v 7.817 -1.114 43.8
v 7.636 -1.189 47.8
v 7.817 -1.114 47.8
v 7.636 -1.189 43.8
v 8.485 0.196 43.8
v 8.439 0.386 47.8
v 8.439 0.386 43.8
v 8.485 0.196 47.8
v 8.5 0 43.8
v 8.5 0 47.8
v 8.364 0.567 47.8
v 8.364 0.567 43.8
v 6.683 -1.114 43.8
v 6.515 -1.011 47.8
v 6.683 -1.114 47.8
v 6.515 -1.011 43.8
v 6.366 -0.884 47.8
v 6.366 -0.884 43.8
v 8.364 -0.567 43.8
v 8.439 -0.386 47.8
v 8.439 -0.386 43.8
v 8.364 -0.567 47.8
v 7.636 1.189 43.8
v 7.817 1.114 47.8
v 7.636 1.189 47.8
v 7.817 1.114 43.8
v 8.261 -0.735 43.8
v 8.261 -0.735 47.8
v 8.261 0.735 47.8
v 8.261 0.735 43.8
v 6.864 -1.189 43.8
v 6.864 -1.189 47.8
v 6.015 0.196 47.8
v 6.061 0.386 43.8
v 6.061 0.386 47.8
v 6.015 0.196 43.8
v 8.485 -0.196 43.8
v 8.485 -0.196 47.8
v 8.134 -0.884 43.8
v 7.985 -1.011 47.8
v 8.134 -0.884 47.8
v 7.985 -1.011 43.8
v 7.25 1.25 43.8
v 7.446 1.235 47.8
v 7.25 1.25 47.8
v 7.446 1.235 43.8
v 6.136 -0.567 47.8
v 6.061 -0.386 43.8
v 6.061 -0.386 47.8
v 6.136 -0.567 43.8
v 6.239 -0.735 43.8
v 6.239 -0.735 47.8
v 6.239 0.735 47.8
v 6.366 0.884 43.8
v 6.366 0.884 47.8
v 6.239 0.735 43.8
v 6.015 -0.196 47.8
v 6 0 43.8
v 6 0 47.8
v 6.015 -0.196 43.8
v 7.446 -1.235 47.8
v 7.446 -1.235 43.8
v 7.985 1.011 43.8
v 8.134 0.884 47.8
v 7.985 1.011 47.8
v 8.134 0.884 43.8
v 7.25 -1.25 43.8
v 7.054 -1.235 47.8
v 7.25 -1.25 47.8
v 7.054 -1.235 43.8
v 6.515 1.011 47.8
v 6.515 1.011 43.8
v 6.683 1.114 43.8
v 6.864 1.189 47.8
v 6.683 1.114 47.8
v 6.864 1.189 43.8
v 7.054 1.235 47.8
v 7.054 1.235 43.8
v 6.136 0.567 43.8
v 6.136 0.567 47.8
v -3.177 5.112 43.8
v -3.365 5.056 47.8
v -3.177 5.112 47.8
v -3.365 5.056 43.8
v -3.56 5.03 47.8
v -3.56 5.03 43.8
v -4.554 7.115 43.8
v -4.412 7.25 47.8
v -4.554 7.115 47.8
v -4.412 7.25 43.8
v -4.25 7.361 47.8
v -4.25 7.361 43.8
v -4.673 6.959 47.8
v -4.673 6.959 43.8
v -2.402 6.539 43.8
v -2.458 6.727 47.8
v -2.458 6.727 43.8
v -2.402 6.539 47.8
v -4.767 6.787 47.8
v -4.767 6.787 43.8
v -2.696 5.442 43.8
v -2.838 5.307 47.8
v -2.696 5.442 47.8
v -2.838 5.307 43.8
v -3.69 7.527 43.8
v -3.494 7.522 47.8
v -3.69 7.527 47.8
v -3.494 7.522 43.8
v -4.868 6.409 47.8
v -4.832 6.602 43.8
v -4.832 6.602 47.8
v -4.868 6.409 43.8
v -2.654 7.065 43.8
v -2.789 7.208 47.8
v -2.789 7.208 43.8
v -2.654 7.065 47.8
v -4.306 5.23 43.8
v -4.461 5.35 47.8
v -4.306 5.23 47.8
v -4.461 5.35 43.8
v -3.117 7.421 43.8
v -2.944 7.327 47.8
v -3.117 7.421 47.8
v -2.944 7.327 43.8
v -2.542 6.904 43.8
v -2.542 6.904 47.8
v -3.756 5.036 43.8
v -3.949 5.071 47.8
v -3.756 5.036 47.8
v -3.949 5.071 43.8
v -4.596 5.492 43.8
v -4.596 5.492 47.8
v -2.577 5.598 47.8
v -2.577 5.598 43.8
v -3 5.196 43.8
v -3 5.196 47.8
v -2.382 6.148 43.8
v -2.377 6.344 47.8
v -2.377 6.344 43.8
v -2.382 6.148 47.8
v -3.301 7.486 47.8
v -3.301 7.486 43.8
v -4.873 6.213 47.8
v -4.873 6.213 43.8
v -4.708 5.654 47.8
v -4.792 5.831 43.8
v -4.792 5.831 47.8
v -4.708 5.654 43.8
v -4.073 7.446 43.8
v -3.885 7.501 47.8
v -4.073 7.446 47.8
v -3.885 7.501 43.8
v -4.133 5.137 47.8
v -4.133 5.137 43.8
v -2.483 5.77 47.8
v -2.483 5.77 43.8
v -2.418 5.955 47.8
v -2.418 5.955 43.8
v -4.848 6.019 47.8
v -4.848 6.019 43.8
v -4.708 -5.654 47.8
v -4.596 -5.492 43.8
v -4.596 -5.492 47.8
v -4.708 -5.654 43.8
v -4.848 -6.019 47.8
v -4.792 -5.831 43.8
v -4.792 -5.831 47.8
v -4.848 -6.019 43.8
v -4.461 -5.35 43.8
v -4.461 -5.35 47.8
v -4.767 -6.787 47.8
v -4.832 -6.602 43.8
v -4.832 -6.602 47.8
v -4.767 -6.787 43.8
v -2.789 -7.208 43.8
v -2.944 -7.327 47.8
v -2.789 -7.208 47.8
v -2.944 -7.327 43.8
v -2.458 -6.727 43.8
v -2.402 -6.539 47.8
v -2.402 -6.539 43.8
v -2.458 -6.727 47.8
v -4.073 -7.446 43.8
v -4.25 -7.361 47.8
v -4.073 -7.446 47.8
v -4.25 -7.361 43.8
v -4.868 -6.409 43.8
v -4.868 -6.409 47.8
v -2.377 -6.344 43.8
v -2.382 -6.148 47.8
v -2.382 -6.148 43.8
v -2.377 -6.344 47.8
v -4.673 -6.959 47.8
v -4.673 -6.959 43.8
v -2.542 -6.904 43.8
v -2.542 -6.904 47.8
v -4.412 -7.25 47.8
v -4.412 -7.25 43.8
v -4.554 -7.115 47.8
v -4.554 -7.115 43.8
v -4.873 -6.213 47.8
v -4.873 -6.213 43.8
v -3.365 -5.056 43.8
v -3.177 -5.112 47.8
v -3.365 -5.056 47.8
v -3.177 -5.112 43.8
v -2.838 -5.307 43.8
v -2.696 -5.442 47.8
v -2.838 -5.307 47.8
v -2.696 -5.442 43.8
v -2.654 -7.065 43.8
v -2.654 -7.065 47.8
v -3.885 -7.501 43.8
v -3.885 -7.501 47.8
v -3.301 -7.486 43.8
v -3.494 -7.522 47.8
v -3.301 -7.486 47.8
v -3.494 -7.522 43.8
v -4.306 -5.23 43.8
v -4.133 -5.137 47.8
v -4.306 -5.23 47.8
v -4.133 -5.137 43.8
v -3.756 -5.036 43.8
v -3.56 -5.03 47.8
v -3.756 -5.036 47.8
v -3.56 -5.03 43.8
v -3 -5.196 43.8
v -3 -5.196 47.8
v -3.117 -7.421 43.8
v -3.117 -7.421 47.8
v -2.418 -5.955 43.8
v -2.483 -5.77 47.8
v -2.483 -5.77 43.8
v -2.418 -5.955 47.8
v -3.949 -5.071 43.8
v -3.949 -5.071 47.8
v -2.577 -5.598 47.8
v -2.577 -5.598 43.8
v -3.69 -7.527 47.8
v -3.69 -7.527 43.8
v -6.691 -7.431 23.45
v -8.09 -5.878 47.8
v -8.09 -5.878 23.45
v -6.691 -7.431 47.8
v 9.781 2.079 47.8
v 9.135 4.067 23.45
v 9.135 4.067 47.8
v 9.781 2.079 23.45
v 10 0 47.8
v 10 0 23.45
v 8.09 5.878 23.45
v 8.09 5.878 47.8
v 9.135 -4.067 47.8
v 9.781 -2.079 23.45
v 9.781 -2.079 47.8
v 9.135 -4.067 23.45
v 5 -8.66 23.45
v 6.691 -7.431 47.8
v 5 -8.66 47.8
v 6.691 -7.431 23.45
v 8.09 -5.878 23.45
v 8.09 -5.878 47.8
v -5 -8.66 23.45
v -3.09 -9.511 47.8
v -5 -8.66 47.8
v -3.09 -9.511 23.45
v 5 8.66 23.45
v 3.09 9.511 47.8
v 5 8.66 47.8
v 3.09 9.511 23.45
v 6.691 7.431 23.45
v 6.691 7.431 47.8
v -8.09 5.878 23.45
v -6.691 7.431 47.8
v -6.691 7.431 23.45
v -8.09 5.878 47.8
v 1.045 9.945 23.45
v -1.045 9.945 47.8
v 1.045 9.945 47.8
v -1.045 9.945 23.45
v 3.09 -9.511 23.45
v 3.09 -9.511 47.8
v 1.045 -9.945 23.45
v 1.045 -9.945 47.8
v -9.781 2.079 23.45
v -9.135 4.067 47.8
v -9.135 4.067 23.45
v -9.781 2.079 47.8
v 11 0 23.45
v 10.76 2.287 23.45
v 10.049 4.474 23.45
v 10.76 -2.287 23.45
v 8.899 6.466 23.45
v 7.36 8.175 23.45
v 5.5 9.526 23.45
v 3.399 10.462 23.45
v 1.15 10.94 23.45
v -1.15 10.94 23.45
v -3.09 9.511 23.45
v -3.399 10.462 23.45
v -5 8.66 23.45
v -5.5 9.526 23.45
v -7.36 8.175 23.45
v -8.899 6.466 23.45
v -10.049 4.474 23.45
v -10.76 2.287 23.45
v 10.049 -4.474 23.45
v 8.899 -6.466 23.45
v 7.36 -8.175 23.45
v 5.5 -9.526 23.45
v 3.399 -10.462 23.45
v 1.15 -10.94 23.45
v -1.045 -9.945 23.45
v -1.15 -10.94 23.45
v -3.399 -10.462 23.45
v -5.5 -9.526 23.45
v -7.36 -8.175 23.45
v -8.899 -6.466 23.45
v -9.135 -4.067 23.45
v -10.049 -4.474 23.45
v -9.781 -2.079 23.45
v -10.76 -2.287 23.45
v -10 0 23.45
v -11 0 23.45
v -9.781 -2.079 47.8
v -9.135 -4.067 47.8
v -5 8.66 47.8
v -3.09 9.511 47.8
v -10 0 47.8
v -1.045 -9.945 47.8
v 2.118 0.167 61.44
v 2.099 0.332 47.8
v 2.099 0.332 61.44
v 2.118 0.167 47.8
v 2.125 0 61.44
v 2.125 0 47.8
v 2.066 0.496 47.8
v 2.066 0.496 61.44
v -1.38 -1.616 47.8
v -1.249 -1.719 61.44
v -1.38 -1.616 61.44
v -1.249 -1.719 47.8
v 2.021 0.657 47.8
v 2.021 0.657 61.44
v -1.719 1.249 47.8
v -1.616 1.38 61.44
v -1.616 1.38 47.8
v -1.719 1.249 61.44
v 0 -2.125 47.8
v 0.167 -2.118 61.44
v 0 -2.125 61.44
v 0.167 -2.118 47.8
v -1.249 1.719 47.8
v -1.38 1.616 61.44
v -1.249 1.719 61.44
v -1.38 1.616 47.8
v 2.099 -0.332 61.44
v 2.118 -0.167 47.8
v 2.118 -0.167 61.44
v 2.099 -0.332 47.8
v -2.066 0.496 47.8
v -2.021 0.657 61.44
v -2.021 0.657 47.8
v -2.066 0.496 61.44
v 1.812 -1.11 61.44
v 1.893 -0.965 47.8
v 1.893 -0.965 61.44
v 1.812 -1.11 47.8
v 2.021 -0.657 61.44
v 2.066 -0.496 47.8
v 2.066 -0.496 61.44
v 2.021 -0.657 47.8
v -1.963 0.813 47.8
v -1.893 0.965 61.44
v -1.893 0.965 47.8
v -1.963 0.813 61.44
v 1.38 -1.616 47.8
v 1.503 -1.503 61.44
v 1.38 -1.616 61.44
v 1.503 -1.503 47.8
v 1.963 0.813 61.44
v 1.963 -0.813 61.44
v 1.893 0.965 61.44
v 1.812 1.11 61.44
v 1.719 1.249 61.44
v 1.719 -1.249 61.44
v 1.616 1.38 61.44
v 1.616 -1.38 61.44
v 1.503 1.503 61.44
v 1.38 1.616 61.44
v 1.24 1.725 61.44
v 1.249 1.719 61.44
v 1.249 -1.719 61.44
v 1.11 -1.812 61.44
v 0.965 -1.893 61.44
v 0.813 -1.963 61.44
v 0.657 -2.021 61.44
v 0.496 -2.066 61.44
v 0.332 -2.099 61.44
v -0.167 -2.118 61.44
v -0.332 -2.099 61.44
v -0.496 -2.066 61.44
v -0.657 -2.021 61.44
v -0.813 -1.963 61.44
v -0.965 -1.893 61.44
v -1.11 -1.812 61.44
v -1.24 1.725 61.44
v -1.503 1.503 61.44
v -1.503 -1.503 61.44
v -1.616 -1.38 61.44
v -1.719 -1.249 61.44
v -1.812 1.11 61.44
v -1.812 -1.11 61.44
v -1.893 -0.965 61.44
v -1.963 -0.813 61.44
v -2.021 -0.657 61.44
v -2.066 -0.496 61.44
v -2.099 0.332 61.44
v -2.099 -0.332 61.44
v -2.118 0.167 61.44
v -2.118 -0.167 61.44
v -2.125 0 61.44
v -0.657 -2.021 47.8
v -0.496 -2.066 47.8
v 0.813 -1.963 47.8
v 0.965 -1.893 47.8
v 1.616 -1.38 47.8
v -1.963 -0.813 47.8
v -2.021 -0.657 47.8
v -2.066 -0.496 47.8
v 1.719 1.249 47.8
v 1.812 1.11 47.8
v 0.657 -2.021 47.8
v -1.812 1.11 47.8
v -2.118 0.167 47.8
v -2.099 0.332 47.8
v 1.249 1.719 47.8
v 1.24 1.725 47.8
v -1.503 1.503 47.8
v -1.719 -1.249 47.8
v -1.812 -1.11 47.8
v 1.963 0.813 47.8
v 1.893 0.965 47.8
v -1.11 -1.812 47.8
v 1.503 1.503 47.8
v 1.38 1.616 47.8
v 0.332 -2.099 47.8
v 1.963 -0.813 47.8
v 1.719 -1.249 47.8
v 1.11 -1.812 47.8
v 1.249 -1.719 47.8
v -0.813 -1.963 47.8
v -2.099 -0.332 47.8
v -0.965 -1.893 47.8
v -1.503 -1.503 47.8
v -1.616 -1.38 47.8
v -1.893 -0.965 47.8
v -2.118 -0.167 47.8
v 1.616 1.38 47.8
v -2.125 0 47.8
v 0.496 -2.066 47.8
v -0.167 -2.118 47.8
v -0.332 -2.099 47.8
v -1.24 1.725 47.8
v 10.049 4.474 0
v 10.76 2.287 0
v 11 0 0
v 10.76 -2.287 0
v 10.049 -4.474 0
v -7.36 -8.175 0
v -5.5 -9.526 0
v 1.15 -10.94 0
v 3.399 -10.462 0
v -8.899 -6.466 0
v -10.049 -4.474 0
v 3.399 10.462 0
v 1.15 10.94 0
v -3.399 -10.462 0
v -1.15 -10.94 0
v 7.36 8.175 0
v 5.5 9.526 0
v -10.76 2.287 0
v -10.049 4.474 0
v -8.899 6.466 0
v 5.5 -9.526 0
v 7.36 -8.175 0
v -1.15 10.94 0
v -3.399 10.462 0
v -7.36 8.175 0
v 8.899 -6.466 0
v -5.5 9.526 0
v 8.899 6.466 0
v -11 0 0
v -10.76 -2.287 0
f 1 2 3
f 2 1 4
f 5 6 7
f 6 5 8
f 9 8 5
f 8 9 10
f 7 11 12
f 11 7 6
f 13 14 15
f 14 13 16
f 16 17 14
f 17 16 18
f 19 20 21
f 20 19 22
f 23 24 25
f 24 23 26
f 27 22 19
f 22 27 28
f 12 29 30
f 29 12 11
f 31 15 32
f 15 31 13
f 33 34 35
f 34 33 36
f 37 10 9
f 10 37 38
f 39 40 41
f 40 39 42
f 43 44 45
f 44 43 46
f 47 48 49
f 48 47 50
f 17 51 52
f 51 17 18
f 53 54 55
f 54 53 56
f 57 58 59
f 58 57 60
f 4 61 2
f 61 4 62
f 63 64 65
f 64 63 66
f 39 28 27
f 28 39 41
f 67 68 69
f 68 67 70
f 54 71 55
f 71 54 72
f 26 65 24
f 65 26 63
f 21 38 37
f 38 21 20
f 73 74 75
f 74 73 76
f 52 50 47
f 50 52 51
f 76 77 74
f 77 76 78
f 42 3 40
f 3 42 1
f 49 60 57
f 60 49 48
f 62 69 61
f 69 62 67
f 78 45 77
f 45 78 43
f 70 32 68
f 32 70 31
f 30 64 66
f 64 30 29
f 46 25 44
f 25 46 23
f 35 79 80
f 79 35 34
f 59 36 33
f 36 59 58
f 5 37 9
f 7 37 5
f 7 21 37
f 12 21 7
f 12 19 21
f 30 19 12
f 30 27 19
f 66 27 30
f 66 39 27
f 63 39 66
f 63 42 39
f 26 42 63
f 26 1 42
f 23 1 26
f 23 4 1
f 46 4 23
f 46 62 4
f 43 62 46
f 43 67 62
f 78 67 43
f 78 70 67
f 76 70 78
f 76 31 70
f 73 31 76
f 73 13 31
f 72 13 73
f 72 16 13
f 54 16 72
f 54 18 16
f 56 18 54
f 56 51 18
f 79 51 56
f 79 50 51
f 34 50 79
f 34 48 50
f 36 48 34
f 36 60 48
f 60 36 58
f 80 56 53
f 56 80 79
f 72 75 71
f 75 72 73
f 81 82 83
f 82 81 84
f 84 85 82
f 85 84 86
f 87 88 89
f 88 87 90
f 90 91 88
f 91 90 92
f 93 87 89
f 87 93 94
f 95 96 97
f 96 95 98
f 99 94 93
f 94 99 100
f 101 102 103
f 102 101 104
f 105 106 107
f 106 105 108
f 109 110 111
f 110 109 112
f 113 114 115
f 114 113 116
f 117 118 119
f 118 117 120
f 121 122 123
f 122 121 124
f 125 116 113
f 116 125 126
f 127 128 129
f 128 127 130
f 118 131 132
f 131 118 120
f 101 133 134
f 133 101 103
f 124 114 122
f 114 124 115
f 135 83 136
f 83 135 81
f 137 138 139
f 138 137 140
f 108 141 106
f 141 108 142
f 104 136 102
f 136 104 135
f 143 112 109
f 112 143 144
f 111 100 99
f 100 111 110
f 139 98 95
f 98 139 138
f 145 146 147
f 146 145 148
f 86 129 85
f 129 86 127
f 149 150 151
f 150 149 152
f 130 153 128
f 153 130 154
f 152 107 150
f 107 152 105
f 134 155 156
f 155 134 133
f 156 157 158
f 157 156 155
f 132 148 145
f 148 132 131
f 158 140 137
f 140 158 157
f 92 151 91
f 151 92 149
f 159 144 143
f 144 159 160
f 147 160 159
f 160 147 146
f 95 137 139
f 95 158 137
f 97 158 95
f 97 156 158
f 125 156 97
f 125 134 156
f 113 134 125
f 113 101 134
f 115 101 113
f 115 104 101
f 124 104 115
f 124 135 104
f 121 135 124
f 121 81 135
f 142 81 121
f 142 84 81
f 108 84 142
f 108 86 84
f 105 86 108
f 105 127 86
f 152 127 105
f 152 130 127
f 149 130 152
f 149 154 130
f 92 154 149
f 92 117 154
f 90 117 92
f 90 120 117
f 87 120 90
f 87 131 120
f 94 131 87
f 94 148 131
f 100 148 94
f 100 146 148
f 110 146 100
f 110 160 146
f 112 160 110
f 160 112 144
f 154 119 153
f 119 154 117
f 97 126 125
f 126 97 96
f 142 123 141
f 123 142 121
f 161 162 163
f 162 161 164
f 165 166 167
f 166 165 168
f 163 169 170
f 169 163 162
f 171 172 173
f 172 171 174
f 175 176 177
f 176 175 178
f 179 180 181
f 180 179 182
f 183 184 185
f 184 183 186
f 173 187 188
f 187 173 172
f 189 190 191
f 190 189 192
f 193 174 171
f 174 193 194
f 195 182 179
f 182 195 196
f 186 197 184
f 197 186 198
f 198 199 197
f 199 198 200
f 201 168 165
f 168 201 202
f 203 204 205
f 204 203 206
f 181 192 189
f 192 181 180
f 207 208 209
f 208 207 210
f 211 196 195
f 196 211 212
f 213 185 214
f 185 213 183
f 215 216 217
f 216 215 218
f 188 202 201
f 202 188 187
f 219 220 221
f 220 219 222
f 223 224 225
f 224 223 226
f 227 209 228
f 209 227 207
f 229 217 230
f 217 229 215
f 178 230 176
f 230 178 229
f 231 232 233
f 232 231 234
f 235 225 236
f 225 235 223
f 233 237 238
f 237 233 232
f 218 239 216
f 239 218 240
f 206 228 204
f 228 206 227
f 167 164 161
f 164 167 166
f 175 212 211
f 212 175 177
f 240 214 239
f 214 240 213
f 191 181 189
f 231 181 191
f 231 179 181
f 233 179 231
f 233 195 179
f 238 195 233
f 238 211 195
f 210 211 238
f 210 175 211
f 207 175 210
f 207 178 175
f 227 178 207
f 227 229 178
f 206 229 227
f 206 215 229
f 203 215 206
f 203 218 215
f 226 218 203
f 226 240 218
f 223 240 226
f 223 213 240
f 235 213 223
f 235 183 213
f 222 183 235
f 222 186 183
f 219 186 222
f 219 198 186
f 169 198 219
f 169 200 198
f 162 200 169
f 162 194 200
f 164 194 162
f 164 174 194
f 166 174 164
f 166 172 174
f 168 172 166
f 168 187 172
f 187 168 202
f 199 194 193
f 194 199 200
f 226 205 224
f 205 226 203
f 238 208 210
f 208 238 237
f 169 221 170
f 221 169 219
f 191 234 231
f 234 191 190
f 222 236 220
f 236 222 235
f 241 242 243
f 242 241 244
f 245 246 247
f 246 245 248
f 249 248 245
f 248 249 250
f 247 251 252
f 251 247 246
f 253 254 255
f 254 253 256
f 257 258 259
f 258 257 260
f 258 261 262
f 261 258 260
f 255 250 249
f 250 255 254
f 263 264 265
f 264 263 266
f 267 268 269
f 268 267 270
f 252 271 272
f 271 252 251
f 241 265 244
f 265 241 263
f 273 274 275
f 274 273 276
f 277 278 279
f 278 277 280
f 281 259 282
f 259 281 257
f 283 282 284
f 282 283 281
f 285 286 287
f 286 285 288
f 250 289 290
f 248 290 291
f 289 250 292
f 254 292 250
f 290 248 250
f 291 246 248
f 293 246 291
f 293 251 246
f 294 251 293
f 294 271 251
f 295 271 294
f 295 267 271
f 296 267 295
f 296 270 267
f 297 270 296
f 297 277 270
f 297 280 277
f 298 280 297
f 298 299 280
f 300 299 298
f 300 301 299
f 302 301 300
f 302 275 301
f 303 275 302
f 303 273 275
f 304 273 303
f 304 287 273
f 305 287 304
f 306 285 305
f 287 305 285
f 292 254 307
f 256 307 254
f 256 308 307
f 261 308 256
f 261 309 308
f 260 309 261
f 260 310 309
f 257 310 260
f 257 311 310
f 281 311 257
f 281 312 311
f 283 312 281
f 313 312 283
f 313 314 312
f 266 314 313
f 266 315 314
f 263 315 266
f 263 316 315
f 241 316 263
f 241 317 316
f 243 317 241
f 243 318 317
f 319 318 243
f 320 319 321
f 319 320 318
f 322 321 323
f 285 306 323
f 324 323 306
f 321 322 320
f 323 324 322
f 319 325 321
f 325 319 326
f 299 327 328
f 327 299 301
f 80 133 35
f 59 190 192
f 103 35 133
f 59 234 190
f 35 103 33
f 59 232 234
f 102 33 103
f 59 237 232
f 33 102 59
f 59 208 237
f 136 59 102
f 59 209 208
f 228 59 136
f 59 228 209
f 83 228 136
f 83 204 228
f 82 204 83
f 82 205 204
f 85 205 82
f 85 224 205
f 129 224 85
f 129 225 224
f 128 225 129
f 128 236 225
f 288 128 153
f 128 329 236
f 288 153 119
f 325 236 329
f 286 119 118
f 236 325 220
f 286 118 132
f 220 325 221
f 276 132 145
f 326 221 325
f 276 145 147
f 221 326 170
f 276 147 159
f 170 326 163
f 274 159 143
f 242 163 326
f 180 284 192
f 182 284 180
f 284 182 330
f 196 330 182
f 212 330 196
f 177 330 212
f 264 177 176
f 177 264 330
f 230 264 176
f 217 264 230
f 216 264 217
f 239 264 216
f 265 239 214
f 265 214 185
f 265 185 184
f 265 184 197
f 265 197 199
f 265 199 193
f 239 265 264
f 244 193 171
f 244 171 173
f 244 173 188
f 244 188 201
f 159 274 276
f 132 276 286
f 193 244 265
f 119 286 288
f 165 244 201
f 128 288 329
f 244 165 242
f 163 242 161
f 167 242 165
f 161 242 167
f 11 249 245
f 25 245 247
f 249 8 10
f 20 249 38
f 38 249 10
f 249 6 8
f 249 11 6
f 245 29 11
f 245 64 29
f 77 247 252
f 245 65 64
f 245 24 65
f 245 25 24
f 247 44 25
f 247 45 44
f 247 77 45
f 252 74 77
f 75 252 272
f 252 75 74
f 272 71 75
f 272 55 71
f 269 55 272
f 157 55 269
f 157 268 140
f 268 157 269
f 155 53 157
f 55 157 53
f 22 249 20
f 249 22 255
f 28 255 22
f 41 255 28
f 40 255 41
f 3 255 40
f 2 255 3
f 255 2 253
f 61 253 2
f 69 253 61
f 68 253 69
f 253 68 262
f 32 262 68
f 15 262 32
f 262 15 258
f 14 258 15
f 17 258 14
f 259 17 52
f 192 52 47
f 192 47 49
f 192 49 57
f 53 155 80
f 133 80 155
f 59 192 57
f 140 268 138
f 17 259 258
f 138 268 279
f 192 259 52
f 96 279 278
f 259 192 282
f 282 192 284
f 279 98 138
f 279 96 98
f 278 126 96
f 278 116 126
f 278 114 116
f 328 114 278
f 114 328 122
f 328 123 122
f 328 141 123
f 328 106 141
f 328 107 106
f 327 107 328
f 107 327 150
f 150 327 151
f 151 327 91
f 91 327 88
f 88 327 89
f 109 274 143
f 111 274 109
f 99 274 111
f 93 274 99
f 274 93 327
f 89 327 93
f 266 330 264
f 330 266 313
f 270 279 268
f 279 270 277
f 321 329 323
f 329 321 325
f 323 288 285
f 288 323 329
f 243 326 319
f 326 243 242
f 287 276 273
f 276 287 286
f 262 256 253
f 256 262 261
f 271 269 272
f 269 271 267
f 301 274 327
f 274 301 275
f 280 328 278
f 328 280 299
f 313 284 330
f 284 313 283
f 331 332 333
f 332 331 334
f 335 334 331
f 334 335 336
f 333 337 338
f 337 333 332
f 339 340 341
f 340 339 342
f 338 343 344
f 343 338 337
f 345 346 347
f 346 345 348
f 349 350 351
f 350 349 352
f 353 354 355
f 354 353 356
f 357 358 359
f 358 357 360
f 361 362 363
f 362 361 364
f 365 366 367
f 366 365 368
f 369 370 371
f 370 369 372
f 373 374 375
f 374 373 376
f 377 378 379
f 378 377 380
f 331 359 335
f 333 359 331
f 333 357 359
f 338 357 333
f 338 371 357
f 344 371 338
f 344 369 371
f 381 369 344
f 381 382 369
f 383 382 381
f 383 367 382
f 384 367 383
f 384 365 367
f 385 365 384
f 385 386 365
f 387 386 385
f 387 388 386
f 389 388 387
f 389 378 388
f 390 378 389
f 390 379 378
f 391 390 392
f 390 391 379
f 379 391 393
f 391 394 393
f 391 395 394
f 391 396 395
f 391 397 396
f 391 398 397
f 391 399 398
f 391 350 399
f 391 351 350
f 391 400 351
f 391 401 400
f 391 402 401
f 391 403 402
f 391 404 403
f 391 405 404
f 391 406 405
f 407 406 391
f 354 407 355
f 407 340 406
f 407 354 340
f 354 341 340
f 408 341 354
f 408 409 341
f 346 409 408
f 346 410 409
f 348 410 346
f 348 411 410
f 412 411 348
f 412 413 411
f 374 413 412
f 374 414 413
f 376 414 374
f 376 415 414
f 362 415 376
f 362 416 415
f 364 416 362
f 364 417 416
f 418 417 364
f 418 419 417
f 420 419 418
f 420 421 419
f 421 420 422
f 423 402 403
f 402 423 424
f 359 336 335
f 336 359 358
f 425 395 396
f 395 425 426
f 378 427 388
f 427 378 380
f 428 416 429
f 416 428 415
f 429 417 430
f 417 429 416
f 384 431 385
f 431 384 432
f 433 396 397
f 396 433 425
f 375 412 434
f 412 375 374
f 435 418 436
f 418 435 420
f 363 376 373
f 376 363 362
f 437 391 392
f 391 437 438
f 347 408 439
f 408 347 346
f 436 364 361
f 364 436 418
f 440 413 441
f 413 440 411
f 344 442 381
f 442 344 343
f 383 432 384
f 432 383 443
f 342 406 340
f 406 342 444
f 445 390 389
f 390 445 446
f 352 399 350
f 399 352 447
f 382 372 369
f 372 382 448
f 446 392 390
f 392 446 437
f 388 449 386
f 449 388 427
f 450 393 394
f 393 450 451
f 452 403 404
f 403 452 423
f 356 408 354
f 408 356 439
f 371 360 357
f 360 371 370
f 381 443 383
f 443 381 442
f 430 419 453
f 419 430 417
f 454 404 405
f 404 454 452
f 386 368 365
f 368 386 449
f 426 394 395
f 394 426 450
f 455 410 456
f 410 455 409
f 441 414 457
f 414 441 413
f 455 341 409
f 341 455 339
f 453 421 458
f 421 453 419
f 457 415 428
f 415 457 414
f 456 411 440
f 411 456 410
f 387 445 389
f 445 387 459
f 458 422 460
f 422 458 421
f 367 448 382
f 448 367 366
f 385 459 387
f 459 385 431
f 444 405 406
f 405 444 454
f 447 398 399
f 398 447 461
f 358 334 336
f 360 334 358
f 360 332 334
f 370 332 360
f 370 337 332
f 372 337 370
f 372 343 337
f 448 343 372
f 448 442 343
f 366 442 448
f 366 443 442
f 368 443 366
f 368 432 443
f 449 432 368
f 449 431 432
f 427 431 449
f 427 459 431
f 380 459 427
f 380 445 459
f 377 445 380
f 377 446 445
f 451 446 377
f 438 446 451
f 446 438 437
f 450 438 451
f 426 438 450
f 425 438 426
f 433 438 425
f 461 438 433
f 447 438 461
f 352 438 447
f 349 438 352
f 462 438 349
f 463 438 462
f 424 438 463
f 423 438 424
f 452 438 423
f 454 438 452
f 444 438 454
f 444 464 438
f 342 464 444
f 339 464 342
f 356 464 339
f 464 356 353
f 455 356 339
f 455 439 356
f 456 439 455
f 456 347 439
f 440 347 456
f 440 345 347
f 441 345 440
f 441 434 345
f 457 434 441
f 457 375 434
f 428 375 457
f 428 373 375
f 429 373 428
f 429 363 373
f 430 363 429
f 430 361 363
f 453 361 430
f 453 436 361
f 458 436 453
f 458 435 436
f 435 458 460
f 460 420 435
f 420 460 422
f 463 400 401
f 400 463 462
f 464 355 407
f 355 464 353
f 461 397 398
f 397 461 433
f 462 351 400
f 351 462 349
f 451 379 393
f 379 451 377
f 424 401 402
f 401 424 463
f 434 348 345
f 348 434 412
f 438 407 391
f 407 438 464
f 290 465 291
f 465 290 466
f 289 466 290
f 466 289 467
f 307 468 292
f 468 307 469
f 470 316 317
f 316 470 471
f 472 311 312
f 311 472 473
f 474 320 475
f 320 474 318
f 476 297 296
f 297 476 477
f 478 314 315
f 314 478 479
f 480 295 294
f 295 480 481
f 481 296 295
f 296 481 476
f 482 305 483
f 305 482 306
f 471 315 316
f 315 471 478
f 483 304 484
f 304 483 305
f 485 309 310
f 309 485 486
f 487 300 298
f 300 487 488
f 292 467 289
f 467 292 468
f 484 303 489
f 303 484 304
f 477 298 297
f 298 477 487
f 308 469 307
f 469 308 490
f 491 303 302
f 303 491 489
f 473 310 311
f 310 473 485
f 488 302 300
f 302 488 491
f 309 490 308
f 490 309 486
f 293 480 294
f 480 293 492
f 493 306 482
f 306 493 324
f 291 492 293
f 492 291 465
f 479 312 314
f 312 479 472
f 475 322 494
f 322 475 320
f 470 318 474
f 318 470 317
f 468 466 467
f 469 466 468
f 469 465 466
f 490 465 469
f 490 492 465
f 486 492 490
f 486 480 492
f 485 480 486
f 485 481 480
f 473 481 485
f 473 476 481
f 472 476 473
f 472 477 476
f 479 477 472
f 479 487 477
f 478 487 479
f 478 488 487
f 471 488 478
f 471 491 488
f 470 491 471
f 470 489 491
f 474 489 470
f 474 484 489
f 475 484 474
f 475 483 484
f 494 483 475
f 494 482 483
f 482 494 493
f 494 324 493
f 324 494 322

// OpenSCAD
// file: params.scad
inch = 25.4;

canDiameter = 3.1*inch;
canLength = 9.2 * inch;

bearingW1 = 28+0.5;
bearingW2 = 32+1;
bearingIW = 16;
bearingBW = 25;
bearingH = 8;
bearingT = 1;

motorD1 = 22;
motorD2 = 20;
motorDfl = 3.6+0.25;
motorDsh = 4+0.25;
motorFl = 7.5;
motorL1 = 23.45;
motorL2 = 47.8-motorL1;
motorL3 = 64.52 - 3.08 - motorL1 - motorL2;

motorScrewD = 2.5;
motorHoleLenTo = motorD2/2 -( 1.5+motorScrewD/2);
motorScrewL = 4;
canToclampTolerance = 2;
clampLength = canLength / 2;
clampThickness = 5;
clampSpace = 25;

brainH = 45;
brainW = 63;
brainL = 121;
boxT = 5;
boxClearance = 10;

armInnerW = canDiameter + clampThickness*2;
armThickness = 15;
armHeight = canDiameter/2 + clampThickness + brainH + boxClearance; 

gearDistance = 42+1.5;
legW = 20-0.5;
legL = 200;
legH = legW;

potTh = 4.5;
potW = 9.6 + 0.25;
potL = 9.65 + 0.25;
potLen = 12.63-potTh;
potRad = 3.55/2+0.25;
potSlit = 1;
potSlitL = 1.5;

megaR = 1.3;
megaIn = 2.5;
megadx = 24.1;
megadxy = 15.2;
megady = 27.9;
// main file
include <params.scad>

faulhaber();
module faulhaber(d1 = motorD1, d2 = motorD2 ,d3 = motorDsh,df3 = motorDfl,l1 = motorL1,l2 = motorL2, l3 = motorL3){
  union(){
    color("black") cylinder(r=d1/2,h=l1);
    difference(){
      color("blue",0.9) translate([0,0,l1]) cylinder(r=d2/2,h=l2);
      translate([0,0,l1+l2]) motorHoles();
    }
    color("silver") translate([0,0,l1+l2]) motorShaft();
  }
}
module motorShaft(d=motorDsh,df=motorDfl,h=motorL3){
  difference(){ 
    cylinder(r=d/2,h=h,$fn=80);
    translate([-d/2,d/2-(d-df),0]) cube([d,d,h+2]);
    echo(d-df);
  }
}

module motorHoles(d = motorScrewD,l=motorHoleLenTo,h = motorScrewL){
  translate([0,0,-h])  union(){
    translate([l,0,0]) cylinder(r=d/2,h=h,$fn=40);
    rotate([0,0,120]) translate([l,0,0]) cylinder(r=d/2,h=h,$fn=40);
    rotate([0,0,-120]) translate([l,0,0]) cylinder(r=d/2,h=h,$fn=40);
  }
}
